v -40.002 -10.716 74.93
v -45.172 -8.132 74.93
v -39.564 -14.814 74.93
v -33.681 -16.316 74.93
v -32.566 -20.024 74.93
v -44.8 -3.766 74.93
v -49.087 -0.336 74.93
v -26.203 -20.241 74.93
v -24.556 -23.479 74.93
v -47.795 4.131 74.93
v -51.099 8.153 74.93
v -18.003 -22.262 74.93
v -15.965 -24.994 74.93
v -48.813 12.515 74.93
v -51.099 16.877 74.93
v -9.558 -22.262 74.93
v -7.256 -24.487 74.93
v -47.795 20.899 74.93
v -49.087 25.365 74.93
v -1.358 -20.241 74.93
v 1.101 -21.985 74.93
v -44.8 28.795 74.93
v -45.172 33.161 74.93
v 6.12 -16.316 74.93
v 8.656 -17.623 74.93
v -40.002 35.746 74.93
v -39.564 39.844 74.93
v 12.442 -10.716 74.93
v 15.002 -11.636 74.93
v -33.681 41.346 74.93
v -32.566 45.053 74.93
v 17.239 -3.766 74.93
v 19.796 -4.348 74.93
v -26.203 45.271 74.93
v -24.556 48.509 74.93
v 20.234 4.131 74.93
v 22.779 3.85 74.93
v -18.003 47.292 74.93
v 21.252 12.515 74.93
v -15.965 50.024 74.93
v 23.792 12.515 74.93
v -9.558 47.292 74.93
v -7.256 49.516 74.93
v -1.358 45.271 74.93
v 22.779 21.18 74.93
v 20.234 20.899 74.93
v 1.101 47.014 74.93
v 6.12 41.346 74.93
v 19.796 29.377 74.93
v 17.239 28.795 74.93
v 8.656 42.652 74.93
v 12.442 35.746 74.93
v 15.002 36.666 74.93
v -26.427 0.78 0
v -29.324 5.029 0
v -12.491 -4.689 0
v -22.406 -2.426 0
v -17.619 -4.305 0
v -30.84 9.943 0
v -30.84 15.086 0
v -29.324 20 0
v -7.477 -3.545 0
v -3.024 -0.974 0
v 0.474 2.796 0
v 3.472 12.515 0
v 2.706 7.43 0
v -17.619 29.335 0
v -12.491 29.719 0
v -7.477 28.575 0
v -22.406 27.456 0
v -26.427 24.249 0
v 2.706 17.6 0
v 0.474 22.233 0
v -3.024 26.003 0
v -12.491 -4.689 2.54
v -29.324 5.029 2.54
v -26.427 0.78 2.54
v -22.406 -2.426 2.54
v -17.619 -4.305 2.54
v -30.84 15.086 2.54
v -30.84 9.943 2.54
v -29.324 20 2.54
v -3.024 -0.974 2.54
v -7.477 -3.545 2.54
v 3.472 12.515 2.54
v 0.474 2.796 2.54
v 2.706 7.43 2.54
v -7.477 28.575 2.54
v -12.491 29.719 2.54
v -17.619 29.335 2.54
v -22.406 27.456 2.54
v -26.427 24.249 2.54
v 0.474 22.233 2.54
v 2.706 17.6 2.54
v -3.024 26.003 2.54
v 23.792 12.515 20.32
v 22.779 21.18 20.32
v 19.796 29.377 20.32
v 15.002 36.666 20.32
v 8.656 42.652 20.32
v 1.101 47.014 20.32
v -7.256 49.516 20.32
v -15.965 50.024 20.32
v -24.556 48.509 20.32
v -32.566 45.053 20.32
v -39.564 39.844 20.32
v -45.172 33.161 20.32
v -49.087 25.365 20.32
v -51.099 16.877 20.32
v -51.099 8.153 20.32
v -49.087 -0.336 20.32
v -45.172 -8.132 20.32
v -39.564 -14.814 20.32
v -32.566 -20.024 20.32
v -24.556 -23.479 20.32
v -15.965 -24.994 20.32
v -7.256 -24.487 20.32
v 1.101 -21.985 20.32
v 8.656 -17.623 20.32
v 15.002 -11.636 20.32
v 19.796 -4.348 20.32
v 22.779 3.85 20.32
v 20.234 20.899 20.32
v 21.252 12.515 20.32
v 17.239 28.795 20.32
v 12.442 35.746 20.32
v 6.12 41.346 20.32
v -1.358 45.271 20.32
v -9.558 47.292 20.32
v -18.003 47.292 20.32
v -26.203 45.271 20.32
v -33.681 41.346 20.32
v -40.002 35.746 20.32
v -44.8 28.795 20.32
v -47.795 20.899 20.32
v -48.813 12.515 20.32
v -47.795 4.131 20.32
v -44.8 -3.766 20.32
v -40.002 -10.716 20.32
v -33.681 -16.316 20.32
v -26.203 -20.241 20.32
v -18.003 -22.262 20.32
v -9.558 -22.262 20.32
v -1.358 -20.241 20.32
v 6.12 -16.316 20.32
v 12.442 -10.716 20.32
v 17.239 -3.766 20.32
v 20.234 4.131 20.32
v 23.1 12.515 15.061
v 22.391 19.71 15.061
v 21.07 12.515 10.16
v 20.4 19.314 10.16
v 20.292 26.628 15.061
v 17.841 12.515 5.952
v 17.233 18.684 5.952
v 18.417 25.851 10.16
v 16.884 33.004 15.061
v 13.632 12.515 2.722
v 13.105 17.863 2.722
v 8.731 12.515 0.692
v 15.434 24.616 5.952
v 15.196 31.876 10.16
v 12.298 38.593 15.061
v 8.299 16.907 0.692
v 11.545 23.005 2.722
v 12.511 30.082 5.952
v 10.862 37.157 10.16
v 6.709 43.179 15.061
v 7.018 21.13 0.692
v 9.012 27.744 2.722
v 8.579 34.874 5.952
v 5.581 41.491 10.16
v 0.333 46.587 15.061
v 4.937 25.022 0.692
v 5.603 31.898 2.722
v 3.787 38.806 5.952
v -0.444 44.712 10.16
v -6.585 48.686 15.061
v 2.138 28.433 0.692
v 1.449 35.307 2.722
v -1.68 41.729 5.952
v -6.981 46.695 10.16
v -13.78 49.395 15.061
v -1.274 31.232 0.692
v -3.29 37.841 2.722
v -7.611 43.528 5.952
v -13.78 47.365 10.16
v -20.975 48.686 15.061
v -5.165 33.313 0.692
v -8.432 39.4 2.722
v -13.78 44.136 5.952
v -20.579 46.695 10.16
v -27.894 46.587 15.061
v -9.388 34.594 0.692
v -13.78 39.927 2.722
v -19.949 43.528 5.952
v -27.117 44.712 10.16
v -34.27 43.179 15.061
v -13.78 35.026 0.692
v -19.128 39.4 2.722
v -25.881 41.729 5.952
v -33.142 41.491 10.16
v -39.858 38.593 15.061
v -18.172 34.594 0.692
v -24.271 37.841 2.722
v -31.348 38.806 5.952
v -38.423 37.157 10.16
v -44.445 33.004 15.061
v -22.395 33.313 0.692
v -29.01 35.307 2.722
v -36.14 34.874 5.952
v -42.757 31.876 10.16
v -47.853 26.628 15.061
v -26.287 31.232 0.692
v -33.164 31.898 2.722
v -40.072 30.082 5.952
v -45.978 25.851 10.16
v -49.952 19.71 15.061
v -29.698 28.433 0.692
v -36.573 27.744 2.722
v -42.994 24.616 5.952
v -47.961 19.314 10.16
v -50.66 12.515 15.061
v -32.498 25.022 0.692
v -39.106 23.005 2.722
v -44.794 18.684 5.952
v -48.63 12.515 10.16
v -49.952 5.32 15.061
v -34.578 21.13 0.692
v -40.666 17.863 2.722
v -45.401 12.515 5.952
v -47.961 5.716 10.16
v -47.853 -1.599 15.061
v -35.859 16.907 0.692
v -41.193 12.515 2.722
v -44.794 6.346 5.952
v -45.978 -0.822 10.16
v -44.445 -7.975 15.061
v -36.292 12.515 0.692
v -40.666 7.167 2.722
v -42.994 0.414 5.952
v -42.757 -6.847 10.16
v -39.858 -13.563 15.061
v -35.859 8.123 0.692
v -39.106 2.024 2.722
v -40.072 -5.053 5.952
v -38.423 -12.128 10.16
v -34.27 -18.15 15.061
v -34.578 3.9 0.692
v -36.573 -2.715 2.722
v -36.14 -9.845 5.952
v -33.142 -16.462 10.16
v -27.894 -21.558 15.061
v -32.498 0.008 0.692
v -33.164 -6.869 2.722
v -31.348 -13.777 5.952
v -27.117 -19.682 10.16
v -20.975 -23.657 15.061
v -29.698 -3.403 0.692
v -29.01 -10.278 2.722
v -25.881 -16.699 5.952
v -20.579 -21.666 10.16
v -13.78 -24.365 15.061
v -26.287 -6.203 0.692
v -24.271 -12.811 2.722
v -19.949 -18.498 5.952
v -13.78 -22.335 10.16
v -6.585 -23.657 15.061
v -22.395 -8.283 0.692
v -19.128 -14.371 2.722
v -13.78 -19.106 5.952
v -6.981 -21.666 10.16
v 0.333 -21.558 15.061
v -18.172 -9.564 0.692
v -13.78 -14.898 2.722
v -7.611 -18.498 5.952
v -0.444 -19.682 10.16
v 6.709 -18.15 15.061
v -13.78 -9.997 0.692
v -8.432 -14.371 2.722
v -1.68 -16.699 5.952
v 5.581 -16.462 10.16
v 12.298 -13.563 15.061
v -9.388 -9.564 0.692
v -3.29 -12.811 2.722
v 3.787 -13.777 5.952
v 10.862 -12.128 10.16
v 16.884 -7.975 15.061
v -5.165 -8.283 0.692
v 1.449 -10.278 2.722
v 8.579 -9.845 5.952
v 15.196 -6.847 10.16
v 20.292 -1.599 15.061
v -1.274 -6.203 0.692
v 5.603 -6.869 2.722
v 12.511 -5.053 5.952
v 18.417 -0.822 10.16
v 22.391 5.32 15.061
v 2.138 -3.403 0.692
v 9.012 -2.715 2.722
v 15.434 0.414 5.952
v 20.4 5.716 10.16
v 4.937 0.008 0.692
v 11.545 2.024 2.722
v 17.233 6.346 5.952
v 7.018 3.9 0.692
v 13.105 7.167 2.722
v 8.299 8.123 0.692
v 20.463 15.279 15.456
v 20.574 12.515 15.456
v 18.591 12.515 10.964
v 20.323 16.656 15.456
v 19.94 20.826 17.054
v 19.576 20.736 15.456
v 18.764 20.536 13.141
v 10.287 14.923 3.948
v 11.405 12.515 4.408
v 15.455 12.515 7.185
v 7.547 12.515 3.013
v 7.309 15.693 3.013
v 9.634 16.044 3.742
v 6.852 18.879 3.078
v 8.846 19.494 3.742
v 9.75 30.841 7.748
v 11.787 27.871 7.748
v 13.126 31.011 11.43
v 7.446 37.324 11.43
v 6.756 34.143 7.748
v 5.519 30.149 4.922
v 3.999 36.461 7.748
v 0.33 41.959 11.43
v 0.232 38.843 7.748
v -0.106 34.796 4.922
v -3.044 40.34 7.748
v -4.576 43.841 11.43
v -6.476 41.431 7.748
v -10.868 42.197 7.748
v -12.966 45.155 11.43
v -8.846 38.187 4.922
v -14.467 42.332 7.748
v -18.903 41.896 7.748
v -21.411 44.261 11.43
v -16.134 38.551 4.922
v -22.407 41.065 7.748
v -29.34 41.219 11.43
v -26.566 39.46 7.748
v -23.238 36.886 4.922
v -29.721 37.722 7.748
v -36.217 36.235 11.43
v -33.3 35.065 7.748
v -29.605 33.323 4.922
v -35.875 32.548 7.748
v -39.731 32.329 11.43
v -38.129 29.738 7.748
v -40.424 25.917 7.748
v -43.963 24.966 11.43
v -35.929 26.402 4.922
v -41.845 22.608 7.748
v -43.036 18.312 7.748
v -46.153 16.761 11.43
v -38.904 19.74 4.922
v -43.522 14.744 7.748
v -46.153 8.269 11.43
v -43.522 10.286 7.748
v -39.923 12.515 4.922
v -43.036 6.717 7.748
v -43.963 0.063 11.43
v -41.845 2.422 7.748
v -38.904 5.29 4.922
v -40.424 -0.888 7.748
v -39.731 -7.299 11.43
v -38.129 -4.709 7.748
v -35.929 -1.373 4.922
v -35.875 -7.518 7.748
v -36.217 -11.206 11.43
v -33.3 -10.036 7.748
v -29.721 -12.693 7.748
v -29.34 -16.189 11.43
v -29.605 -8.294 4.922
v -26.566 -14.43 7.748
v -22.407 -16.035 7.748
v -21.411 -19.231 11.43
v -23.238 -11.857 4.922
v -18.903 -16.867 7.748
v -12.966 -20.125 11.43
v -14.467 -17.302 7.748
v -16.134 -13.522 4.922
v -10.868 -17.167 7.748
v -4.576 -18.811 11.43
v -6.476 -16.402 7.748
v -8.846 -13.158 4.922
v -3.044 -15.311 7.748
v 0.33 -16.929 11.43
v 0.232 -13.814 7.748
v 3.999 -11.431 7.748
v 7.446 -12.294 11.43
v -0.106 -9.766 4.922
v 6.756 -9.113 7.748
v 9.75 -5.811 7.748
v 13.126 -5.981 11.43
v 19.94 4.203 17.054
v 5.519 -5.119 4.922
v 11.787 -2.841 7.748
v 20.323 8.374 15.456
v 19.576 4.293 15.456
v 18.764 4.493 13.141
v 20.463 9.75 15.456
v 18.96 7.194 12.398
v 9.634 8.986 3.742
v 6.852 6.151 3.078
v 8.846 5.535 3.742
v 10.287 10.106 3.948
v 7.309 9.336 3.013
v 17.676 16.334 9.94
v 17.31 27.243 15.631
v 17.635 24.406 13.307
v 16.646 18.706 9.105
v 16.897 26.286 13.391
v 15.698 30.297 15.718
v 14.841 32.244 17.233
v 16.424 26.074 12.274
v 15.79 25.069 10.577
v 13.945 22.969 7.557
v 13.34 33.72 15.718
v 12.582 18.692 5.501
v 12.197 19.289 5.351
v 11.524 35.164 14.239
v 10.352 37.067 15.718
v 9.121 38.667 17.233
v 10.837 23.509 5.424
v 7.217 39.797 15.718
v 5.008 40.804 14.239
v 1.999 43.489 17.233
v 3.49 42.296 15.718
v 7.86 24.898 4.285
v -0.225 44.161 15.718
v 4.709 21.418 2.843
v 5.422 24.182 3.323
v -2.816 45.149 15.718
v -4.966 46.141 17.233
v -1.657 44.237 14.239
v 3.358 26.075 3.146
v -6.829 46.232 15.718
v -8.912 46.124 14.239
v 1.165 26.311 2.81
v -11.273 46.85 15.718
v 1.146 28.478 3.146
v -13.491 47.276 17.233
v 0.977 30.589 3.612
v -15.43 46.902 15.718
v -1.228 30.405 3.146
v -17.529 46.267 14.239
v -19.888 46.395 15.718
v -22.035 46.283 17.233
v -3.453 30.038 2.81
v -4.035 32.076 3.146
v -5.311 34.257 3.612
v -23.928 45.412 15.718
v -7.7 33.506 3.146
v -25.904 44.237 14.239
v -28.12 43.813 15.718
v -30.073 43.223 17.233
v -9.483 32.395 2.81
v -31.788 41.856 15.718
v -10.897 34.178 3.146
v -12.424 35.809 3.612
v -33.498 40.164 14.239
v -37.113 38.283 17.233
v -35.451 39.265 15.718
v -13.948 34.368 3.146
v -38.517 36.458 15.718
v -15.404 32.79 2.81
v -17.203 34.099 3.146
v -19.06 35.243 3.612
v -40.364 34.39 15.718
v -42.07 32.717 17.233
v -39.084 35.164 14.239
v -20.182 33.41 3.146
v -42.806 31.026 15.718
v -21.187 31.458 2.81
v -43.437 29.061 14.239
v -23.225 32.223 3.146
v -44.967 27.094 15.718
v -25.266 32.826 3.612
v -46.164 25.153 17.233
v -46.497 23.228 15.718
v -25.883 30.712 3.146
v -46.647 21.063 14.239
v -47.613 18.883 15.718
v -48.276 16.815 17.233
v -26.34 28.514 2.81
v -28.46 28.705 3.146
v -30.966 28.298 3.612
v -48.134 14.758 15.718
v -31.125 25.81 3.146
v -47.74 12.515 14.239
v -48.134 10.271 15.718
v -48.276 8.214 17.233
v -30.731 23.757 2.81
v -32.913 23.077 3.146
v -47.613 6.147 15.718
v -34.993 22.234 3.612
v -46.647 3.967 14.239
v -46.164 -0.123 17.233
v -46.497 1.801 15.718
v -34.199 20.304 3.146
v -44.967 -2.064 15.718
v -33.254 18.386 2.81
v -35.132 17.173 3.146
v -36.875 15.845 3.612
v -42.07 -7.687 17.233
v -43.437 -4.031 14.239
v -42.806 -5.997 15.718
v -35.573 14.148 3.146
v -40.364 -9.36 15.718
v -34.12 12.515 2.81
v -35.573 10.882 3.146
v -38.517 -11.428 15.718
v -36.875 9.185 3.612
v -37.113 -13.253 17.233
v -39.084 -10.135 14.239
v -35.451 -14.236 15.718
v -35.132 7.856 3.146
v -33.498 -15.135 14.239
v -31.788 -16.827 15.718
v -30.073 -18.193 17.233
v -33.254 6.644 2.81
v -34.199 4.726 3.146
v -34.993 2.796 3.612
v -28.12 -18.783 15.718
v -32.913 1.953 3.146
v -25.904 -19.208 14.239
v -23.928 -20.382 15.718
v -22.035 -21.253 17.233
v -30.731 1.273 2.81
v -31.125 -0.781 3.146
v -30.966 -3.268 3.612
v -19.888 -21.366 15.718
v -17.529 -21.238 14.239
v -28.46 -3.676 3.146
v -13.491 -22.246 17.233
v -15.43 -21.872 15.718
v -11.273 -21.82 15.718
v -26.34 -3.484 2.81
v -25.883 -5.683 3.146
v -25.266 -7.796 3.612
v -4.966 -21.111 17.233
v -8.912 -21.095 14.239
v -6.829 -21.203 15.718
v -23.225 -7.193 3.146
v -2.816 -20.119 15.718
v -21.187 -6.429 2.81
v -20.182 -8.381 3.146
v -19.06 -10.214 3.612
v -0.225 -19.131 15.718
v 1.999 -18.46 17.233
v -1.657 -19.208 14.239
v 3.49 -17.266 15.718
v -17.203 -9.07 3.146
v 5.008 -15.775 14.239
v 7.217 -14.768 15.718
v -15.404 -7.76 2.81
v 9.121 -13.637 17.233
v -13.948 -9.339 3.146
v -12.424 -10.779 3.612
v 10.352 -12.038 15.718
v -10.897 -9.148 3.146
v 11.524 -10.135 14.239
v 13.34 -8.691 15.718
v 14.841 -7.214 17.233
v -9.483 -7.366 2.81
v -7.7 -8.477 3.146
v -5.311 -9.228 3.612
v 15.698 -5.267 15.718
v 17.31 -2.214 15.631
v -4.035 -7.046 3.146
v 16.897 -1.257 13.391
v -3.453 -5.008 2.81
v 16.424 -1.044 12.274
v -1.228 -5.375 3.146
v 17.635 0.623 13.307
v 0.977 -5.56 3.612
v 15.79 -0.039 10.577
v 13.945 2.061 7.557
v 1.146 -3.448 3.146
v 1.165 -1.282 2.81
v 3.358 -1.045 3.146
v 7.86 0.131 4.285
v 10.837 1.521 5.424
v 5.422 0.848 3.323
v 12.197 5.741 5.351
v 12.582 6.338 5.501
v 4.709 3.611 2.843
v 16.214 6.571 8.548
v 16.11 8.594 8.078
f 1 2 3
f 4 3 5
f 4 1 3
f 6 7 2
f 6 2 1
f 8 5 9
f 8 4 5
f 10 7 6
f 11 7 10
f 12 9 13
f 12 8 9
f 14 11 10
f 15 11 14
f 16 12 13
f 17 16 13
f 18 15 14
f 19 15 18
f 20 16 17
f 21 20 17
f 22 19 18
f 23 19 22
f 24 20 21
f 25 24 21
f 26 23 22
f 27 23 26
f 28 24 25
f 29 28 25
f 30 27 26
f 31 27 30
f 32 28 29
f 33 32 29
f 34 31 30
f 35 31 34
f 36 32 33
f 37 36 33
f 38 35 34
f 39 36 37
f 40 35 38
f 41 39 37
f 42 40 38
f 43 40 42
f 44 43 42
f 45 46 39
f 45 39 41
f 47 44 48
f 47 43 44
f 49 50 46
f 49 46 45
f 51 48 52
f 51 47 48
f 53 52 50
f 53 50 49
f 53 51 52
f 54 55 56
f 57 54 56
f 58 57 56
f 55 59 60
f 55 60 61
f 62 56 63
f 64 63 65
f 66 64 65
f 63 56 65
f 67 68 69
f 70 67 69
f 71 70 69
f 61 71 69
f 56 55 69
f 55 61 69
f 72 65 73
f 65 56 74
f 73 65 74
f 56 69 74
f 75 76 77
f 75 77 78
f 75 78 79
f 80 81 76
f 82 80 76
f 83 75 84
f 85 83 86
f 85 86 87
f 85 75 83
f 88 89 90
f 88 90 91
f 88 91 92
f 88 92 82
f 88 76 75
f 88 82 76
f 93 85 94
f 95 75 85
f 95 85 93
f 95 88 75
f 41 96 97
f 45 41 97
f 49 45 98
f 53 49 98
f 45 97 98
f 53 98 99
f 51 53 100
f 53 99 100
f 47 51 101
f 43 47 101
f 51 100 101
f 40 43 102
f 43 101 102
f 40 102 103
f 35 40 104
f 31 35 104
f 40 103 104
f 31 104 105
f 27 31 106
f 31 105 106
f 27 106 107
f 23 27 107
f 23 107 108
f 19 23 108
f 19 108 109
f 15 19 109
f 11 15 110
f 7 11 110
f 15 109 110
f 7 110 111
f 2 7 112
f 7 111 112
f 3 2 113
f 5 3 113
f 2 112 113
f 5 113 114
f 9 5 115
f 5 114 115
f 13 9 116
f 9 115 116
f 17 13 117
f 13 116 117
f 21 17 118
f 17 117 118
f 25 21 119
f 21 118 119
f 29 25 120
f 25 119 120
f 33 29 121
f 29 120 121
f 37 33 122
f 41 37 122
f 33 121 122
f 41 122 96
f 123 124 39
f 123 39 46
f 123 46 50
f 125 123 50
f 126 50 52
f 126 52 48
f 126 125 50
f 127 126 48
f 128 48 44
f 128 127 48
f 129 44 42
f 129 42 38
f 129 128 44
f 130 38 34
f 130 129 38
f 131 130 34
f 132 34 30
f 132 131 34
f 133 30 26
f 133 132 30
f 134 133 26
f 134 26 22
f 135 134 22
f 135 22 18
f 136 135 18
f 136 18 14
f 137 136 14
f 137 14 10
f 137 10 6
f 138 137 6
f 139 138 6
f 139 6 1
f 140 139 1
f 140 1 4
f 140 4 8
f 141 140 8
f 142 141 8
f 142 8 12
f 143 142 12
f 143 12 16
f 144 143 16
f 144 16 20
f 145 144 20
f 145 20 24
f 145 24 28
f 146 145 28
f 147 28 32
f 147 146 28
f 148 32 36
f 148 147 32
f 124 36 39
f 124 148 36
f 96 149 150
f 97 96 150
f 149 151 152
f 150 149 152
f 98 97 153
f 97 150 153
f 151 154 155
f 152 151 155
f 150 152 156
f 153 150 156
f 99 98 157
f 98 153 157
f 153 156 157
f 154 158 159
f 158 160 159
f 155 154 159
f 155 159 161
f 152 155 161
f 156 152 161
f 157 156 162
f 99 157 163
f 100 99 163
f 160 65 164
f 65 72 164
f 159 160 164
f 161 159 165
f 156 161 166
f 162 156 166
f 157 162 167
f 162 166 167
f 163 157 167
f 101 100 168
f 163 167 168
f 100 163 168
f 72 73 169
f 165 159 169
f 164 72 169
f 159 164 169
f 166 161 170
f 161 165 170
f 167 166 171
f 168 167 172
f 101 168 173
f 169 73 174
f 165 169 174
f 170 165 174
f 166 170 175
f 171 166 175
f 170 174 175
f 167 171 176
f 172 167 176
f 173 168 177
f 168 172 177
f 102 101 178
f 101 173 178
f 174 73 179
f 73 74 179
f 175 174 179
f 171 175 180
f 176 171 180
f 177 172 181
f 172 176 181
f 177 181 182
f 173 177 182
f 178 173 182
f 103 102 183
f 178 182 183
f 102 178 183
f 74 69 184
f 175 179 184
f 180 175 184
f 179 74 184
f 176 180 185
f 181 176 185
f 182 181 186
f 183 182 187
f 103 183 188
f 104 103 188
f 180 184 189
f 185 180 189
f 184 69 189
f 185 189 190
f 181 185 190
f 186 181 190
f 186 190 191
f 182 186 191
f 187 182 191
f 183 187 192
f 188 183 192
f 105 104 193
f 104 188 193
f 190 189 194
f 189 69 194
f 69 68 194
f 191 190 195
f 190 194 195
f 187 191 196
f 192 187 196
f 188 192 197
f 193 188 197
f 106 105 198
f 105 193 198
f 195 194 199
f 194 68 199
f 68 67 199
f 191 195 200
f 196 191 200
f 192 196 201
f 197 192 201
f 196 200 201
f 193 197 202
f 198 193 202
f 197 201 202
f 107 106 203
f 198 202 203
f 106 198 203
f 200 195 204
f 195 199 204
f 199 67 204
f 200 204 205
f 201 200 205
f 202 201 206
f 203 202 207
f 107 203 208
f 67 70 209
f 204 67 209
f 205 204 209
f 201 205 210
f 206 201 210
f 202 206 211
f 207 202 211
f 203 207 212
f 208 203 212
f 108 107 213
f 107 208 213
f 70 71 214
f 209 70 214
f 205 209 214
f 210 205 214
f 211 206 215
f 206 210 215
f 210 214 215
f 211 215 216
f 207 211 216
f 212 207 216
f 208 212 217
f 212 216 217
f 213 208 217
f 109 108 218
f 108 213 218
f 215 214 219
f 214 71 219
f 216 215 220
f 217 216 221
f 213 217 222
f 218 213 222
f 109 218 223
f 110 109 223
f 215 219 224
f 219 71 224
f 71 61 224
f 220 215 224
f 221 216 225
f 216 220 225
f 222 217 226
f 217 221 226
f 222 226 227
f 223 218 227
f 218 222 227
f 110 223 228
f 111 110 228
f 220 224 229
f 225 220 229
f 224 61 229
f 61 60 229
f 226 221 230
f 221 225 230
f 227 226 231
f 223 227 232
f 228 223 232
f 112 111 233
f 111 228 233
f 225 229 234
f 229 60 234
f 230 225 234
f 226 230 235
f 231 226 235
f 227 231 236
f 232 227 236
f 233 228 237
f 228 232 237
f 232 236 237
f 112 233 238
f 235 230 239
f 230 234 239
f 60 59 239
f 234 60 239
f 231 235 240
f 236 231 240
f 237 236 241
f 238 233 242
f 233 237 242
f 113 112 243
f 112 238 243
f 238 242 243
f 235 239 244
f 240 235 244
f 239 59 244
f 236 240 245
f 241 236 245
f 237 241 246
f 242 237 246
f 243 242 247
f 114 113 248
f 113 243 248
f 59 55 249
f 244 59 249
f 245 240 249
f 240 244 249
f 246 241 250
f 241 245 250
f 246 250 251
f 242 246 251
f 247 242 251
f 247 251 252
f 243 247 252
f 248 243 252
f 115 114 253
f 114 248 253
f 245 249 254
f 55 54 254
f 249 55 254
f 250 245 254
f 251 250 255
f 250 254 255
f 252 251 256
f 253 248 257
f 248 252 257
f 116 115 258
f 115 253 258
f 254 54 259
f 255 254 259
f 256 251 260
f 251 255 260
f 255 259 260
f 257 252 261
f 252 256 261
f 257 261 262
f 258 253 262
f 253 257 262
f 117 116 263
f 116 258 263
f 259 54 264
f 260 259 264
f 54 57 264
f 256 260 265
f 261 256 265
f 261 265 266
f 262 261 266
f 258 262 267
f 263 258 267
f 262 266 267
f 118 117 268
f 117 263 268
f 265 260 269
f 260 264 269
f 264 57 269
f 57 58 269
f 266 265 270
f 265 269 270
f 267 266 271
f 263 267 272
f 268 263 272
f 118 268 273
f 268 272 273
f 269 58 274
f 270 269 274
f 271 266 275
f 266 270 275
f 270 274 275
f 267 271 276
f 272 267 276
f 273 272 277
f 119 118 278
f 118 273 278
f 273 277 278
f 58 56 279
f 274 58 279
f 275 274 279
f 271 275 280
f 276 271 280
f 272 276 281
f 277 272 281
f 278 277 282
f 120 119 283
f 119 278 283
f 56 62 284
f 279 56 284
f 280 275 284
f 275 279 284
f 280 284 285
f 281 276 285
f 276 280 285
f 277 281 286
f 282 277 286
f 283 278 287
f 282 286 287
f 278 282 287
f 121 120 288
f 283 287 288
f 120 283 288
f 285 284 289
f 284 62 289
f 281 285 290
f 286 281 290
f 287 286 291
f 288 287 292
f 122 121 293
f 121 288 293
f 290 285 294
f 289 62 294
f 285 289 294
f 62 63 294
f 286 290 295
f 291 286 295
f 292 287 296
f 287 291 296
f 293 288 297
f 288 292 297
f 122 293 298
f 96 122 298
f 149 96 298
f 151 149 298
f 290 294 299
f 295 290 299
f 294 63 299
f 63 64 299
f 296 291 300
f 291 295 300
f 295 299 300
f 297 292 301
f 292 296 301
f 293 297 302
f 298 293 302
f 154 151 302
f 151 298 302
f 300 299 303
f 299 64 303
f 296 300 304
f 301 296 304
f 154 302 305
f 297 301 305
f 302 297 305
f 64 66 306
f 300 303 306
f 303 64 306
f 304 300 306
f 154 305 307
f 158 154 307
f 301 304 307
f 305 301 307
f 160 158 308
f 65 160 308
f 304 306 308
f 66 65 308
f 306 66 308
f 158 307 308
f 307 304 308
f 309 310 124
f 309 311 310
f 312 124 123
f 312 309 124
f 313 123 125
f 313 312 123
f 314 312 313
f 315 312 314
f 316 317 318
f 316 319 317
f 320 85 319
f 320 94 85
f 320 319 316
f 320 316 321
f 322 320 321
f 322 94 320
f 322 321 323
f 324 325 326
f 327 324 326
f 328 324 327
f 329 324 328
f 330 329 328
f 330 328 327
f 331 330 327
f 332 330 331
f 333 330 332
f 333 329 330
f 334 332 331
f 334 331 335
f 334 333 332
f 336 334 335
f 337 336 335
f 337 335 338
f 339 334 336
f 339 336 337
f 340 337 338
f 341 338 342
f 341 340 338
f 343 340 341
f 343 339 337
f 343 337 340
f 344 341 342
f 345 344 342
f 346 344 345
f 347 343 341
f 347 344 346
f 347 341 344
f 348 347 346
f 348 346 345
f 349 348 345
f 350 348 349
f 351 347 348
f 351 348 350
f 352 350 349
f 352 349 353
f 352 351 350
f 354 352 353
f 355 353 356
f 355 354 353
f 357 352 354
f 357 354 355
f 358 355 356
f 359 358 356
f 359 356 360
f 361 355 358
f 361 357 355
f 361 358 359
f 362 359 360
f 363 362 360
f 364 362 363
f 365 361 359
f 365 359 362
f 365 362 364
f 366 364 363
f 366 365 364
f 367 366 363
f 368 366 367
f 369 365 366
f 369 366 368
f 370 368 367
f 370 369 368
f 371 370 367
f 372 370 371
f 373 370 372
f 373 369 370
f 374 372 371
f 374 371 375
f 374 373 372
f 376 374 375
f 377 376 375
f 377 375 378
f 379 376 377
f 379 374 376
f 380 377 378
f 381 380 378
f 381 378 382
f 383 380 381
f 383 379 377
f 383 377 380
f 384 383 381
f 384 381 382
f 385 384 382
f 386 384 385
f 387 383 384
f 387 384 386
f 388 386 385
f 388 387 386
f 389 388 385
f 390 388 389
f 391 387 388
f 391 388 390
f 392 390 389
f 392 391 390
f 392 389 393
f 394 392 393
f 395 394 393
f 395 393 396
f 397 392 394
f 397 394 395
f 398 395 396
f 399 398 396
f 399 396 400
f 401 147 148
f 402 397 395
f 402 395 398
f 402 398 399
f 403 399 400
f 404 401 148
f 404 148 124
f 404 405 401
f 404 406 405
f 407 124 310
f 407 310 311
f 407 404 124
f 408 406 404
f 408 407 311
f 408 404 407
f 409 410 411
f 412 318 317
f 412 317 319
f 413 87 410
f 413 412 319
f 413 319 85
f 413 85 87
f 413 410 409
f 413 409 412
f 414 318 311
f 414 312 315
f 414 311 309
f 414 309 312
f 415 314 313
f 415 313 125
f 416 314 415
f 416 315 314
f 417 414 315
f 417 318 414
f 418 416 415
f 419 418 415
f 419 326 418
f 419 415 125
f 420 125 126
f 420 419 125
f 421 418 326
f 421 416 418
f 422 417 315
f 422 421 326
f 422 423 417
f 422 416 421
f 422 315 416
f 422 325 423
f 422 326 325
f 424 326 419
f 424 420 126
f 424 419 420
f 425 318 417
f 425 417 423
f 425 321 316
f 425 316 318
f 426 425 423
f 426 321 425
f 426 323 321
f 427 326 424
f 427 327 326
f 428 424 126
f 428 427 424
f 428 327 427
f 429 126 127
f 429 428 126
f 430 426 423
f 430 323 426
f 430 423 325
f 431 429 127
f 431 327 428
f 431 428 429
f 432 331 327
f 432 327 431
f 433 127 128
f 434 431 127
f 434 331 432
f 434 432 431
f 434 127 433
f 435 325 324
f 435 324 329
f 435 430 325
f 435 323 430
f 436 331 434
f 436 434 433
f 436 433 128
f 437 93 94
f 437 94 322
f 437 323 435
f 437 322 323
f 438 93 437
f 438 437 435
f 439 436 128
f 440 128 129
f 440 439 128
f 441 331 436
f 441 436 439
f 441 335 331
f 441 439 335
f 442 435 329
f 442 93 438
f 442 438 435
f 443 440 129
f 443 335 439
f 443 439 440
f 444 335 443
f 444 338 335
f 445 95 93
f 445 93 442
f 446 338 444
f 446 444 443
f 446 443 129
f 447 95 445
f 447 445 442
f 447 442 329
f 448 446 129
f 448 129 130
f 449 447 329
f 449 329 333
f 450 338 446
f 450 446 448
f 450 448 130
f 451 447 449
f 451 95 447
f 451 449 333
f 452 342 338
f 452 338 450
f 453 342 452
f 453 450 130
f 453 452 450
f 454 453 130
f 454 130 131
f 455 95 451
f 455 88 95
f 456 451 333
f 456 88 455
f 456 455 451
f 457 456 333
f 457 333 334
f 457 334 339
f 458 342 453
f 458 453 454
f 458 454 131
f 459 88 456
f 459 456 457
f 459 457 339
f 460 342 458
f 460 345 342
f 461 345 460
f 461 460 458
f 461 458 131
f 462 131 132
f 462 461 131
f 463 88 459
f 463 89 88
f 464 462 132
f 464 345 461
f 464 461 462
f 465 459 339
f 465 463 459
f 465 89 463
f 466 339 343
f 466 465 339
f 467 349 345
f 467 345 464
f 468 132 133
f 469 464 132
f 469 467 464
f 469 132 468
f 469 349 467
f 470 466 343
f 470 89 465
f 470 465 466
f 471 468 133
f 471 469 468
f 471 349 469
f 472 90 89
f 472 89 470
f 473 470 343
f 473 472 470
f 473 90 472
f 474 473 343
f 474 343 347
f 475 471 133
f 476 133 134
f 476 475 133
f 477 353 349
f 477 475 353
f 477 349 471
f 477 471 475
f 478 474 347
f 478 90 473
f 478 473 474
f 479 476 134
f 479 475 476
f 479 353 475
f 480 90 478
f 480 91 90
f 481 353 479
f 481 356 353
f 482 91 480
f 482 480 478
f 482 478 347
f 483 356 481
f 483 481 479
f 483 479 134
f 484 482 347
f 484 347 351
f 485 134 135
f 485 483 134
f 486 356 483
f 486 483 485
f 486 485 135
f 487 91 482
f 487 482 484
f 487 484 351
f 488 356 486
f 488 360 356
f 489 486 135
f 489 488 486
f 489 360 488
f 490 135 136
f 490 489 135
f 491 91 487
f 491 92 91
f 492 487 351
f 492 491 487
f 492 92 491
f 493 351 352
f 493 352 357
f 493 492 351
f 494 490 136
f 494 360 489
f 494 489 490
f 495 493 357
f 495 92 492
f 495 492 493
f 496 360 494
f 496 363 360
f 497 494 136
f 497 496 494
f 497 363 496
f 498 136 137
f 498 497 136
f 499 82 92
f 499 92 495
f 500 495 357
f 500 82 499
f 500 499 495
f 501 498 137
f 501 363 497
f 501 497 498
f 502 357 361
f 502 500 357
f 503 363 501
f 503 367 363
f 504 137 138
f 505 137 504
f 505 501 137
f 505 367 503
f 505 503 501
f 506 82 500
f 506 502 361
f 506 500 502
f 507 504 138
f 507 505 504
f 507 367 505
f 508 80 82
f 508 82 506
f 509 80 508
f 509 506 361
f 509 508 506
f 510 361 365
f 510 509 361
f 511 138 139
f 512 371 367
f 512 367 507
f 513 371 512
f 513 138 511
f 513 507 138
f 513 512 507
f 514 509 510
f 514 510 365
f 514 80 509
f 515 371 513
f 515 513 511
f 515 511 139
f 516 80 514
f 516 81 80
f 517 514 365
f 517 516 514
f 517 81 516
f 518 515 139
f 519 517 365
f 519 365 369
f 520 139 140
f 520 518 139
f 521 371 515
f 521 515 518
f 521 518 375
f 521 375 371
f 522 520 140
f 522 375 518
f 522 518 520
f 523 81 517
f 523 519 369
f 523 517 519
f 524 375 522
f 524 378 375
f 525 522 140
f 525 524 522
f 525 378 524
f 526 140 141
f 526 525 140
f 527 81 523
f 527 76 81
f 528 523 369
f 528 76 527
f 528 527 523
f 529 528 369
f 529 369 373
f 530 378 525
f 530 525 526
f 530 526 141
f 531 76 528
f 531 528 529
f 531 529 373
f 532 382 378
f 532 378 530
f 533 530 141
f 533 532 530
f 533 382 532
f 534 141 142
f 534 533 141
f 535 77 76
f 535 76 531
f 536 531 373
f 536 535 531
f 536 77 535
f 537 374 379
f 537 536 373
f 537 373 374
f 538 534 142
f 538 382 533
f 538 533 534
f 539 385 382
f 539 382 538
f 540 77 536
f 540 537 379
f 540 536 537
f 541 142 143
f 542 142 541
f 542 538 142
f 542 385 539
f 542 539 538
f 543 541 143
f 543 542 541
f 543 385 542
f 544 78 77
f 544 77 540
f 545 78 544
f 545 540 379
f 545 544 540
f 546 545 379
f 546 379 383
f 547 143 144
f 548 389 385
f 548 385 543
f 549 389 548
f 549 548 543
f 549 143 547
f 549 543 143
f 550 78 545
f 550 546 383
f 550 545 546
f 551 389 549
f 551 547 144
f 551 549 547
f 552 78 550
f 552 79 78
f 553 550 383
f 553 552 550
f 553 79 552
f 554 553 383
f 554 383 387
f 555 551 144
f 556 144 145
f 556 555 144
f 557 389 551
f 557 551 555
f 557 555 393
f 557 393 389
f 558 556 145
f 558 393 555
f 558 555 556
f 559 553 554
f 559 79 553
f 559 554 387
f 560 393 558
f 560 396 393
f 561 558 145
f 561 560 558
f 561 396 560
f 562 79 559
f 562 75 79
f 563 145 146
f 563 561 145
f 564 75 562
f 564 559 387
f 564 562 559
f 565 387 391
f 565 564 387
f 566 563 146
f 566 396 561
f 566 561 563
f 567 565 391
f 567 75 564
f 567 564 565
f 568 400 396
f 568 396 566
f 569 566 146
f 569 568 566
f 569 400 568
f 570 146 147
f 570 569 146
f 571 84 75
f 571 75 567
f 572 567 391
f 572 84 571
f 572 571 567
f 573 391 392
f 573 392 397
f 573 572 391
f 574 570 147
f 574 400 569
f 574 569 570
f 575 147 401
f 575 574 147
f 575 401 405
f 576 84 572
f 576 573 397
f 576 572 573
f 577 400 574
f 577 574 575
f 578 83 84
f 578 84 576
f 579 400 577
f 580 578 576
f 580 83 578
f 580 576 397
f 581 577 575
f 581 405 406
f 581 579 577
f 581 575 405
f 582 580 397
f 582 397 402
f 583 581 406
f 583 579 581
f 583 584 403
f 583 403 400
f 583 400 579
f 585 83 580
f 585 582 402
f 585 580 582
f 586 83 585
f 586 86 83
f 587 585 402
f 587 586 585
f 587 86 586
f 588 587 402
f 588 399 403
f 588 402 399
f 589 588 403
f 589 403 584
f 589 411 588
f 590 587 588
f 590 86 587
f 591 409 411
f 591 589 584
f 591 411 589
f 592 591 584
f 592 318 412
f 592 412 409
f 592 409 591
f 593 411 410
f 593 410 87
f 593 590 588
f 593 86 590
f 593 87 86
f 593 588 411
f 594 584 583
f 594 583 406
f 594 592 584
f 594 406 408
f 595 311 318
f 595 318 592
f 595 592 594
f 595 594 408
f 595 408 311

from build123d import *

# Parameters (mm, degrees)
F0_R     = 37.572403
F1_DEPTH = 74.93
F2_R     = 20.32
F3_T     = -2.54


with BuildPart() as f1:
    # F0 (on Top) → F1 (new body)
    with BuildSketch(Plane.XY):
        with Locations((-13.780282, 12.514745)):
            Circle(F0_R)
    extrude(amount=F1_DEPTH)

    # F2
    f2_edges = [f1.edges().sort_by_distance(p)[0] for p in [
        (-51.352685, 12.514745, 0),
    ]]
    fillet(f2_edges, radius=F2_R)

    # F3
    f3_openings = [f1.faces().sort_by_distance(p)[0] for p in [
        (-13.780282, 12.514745, 74.93),
    ]]
    offset(amount=F3_T, openings=f3_openings)


solid = f1.part
